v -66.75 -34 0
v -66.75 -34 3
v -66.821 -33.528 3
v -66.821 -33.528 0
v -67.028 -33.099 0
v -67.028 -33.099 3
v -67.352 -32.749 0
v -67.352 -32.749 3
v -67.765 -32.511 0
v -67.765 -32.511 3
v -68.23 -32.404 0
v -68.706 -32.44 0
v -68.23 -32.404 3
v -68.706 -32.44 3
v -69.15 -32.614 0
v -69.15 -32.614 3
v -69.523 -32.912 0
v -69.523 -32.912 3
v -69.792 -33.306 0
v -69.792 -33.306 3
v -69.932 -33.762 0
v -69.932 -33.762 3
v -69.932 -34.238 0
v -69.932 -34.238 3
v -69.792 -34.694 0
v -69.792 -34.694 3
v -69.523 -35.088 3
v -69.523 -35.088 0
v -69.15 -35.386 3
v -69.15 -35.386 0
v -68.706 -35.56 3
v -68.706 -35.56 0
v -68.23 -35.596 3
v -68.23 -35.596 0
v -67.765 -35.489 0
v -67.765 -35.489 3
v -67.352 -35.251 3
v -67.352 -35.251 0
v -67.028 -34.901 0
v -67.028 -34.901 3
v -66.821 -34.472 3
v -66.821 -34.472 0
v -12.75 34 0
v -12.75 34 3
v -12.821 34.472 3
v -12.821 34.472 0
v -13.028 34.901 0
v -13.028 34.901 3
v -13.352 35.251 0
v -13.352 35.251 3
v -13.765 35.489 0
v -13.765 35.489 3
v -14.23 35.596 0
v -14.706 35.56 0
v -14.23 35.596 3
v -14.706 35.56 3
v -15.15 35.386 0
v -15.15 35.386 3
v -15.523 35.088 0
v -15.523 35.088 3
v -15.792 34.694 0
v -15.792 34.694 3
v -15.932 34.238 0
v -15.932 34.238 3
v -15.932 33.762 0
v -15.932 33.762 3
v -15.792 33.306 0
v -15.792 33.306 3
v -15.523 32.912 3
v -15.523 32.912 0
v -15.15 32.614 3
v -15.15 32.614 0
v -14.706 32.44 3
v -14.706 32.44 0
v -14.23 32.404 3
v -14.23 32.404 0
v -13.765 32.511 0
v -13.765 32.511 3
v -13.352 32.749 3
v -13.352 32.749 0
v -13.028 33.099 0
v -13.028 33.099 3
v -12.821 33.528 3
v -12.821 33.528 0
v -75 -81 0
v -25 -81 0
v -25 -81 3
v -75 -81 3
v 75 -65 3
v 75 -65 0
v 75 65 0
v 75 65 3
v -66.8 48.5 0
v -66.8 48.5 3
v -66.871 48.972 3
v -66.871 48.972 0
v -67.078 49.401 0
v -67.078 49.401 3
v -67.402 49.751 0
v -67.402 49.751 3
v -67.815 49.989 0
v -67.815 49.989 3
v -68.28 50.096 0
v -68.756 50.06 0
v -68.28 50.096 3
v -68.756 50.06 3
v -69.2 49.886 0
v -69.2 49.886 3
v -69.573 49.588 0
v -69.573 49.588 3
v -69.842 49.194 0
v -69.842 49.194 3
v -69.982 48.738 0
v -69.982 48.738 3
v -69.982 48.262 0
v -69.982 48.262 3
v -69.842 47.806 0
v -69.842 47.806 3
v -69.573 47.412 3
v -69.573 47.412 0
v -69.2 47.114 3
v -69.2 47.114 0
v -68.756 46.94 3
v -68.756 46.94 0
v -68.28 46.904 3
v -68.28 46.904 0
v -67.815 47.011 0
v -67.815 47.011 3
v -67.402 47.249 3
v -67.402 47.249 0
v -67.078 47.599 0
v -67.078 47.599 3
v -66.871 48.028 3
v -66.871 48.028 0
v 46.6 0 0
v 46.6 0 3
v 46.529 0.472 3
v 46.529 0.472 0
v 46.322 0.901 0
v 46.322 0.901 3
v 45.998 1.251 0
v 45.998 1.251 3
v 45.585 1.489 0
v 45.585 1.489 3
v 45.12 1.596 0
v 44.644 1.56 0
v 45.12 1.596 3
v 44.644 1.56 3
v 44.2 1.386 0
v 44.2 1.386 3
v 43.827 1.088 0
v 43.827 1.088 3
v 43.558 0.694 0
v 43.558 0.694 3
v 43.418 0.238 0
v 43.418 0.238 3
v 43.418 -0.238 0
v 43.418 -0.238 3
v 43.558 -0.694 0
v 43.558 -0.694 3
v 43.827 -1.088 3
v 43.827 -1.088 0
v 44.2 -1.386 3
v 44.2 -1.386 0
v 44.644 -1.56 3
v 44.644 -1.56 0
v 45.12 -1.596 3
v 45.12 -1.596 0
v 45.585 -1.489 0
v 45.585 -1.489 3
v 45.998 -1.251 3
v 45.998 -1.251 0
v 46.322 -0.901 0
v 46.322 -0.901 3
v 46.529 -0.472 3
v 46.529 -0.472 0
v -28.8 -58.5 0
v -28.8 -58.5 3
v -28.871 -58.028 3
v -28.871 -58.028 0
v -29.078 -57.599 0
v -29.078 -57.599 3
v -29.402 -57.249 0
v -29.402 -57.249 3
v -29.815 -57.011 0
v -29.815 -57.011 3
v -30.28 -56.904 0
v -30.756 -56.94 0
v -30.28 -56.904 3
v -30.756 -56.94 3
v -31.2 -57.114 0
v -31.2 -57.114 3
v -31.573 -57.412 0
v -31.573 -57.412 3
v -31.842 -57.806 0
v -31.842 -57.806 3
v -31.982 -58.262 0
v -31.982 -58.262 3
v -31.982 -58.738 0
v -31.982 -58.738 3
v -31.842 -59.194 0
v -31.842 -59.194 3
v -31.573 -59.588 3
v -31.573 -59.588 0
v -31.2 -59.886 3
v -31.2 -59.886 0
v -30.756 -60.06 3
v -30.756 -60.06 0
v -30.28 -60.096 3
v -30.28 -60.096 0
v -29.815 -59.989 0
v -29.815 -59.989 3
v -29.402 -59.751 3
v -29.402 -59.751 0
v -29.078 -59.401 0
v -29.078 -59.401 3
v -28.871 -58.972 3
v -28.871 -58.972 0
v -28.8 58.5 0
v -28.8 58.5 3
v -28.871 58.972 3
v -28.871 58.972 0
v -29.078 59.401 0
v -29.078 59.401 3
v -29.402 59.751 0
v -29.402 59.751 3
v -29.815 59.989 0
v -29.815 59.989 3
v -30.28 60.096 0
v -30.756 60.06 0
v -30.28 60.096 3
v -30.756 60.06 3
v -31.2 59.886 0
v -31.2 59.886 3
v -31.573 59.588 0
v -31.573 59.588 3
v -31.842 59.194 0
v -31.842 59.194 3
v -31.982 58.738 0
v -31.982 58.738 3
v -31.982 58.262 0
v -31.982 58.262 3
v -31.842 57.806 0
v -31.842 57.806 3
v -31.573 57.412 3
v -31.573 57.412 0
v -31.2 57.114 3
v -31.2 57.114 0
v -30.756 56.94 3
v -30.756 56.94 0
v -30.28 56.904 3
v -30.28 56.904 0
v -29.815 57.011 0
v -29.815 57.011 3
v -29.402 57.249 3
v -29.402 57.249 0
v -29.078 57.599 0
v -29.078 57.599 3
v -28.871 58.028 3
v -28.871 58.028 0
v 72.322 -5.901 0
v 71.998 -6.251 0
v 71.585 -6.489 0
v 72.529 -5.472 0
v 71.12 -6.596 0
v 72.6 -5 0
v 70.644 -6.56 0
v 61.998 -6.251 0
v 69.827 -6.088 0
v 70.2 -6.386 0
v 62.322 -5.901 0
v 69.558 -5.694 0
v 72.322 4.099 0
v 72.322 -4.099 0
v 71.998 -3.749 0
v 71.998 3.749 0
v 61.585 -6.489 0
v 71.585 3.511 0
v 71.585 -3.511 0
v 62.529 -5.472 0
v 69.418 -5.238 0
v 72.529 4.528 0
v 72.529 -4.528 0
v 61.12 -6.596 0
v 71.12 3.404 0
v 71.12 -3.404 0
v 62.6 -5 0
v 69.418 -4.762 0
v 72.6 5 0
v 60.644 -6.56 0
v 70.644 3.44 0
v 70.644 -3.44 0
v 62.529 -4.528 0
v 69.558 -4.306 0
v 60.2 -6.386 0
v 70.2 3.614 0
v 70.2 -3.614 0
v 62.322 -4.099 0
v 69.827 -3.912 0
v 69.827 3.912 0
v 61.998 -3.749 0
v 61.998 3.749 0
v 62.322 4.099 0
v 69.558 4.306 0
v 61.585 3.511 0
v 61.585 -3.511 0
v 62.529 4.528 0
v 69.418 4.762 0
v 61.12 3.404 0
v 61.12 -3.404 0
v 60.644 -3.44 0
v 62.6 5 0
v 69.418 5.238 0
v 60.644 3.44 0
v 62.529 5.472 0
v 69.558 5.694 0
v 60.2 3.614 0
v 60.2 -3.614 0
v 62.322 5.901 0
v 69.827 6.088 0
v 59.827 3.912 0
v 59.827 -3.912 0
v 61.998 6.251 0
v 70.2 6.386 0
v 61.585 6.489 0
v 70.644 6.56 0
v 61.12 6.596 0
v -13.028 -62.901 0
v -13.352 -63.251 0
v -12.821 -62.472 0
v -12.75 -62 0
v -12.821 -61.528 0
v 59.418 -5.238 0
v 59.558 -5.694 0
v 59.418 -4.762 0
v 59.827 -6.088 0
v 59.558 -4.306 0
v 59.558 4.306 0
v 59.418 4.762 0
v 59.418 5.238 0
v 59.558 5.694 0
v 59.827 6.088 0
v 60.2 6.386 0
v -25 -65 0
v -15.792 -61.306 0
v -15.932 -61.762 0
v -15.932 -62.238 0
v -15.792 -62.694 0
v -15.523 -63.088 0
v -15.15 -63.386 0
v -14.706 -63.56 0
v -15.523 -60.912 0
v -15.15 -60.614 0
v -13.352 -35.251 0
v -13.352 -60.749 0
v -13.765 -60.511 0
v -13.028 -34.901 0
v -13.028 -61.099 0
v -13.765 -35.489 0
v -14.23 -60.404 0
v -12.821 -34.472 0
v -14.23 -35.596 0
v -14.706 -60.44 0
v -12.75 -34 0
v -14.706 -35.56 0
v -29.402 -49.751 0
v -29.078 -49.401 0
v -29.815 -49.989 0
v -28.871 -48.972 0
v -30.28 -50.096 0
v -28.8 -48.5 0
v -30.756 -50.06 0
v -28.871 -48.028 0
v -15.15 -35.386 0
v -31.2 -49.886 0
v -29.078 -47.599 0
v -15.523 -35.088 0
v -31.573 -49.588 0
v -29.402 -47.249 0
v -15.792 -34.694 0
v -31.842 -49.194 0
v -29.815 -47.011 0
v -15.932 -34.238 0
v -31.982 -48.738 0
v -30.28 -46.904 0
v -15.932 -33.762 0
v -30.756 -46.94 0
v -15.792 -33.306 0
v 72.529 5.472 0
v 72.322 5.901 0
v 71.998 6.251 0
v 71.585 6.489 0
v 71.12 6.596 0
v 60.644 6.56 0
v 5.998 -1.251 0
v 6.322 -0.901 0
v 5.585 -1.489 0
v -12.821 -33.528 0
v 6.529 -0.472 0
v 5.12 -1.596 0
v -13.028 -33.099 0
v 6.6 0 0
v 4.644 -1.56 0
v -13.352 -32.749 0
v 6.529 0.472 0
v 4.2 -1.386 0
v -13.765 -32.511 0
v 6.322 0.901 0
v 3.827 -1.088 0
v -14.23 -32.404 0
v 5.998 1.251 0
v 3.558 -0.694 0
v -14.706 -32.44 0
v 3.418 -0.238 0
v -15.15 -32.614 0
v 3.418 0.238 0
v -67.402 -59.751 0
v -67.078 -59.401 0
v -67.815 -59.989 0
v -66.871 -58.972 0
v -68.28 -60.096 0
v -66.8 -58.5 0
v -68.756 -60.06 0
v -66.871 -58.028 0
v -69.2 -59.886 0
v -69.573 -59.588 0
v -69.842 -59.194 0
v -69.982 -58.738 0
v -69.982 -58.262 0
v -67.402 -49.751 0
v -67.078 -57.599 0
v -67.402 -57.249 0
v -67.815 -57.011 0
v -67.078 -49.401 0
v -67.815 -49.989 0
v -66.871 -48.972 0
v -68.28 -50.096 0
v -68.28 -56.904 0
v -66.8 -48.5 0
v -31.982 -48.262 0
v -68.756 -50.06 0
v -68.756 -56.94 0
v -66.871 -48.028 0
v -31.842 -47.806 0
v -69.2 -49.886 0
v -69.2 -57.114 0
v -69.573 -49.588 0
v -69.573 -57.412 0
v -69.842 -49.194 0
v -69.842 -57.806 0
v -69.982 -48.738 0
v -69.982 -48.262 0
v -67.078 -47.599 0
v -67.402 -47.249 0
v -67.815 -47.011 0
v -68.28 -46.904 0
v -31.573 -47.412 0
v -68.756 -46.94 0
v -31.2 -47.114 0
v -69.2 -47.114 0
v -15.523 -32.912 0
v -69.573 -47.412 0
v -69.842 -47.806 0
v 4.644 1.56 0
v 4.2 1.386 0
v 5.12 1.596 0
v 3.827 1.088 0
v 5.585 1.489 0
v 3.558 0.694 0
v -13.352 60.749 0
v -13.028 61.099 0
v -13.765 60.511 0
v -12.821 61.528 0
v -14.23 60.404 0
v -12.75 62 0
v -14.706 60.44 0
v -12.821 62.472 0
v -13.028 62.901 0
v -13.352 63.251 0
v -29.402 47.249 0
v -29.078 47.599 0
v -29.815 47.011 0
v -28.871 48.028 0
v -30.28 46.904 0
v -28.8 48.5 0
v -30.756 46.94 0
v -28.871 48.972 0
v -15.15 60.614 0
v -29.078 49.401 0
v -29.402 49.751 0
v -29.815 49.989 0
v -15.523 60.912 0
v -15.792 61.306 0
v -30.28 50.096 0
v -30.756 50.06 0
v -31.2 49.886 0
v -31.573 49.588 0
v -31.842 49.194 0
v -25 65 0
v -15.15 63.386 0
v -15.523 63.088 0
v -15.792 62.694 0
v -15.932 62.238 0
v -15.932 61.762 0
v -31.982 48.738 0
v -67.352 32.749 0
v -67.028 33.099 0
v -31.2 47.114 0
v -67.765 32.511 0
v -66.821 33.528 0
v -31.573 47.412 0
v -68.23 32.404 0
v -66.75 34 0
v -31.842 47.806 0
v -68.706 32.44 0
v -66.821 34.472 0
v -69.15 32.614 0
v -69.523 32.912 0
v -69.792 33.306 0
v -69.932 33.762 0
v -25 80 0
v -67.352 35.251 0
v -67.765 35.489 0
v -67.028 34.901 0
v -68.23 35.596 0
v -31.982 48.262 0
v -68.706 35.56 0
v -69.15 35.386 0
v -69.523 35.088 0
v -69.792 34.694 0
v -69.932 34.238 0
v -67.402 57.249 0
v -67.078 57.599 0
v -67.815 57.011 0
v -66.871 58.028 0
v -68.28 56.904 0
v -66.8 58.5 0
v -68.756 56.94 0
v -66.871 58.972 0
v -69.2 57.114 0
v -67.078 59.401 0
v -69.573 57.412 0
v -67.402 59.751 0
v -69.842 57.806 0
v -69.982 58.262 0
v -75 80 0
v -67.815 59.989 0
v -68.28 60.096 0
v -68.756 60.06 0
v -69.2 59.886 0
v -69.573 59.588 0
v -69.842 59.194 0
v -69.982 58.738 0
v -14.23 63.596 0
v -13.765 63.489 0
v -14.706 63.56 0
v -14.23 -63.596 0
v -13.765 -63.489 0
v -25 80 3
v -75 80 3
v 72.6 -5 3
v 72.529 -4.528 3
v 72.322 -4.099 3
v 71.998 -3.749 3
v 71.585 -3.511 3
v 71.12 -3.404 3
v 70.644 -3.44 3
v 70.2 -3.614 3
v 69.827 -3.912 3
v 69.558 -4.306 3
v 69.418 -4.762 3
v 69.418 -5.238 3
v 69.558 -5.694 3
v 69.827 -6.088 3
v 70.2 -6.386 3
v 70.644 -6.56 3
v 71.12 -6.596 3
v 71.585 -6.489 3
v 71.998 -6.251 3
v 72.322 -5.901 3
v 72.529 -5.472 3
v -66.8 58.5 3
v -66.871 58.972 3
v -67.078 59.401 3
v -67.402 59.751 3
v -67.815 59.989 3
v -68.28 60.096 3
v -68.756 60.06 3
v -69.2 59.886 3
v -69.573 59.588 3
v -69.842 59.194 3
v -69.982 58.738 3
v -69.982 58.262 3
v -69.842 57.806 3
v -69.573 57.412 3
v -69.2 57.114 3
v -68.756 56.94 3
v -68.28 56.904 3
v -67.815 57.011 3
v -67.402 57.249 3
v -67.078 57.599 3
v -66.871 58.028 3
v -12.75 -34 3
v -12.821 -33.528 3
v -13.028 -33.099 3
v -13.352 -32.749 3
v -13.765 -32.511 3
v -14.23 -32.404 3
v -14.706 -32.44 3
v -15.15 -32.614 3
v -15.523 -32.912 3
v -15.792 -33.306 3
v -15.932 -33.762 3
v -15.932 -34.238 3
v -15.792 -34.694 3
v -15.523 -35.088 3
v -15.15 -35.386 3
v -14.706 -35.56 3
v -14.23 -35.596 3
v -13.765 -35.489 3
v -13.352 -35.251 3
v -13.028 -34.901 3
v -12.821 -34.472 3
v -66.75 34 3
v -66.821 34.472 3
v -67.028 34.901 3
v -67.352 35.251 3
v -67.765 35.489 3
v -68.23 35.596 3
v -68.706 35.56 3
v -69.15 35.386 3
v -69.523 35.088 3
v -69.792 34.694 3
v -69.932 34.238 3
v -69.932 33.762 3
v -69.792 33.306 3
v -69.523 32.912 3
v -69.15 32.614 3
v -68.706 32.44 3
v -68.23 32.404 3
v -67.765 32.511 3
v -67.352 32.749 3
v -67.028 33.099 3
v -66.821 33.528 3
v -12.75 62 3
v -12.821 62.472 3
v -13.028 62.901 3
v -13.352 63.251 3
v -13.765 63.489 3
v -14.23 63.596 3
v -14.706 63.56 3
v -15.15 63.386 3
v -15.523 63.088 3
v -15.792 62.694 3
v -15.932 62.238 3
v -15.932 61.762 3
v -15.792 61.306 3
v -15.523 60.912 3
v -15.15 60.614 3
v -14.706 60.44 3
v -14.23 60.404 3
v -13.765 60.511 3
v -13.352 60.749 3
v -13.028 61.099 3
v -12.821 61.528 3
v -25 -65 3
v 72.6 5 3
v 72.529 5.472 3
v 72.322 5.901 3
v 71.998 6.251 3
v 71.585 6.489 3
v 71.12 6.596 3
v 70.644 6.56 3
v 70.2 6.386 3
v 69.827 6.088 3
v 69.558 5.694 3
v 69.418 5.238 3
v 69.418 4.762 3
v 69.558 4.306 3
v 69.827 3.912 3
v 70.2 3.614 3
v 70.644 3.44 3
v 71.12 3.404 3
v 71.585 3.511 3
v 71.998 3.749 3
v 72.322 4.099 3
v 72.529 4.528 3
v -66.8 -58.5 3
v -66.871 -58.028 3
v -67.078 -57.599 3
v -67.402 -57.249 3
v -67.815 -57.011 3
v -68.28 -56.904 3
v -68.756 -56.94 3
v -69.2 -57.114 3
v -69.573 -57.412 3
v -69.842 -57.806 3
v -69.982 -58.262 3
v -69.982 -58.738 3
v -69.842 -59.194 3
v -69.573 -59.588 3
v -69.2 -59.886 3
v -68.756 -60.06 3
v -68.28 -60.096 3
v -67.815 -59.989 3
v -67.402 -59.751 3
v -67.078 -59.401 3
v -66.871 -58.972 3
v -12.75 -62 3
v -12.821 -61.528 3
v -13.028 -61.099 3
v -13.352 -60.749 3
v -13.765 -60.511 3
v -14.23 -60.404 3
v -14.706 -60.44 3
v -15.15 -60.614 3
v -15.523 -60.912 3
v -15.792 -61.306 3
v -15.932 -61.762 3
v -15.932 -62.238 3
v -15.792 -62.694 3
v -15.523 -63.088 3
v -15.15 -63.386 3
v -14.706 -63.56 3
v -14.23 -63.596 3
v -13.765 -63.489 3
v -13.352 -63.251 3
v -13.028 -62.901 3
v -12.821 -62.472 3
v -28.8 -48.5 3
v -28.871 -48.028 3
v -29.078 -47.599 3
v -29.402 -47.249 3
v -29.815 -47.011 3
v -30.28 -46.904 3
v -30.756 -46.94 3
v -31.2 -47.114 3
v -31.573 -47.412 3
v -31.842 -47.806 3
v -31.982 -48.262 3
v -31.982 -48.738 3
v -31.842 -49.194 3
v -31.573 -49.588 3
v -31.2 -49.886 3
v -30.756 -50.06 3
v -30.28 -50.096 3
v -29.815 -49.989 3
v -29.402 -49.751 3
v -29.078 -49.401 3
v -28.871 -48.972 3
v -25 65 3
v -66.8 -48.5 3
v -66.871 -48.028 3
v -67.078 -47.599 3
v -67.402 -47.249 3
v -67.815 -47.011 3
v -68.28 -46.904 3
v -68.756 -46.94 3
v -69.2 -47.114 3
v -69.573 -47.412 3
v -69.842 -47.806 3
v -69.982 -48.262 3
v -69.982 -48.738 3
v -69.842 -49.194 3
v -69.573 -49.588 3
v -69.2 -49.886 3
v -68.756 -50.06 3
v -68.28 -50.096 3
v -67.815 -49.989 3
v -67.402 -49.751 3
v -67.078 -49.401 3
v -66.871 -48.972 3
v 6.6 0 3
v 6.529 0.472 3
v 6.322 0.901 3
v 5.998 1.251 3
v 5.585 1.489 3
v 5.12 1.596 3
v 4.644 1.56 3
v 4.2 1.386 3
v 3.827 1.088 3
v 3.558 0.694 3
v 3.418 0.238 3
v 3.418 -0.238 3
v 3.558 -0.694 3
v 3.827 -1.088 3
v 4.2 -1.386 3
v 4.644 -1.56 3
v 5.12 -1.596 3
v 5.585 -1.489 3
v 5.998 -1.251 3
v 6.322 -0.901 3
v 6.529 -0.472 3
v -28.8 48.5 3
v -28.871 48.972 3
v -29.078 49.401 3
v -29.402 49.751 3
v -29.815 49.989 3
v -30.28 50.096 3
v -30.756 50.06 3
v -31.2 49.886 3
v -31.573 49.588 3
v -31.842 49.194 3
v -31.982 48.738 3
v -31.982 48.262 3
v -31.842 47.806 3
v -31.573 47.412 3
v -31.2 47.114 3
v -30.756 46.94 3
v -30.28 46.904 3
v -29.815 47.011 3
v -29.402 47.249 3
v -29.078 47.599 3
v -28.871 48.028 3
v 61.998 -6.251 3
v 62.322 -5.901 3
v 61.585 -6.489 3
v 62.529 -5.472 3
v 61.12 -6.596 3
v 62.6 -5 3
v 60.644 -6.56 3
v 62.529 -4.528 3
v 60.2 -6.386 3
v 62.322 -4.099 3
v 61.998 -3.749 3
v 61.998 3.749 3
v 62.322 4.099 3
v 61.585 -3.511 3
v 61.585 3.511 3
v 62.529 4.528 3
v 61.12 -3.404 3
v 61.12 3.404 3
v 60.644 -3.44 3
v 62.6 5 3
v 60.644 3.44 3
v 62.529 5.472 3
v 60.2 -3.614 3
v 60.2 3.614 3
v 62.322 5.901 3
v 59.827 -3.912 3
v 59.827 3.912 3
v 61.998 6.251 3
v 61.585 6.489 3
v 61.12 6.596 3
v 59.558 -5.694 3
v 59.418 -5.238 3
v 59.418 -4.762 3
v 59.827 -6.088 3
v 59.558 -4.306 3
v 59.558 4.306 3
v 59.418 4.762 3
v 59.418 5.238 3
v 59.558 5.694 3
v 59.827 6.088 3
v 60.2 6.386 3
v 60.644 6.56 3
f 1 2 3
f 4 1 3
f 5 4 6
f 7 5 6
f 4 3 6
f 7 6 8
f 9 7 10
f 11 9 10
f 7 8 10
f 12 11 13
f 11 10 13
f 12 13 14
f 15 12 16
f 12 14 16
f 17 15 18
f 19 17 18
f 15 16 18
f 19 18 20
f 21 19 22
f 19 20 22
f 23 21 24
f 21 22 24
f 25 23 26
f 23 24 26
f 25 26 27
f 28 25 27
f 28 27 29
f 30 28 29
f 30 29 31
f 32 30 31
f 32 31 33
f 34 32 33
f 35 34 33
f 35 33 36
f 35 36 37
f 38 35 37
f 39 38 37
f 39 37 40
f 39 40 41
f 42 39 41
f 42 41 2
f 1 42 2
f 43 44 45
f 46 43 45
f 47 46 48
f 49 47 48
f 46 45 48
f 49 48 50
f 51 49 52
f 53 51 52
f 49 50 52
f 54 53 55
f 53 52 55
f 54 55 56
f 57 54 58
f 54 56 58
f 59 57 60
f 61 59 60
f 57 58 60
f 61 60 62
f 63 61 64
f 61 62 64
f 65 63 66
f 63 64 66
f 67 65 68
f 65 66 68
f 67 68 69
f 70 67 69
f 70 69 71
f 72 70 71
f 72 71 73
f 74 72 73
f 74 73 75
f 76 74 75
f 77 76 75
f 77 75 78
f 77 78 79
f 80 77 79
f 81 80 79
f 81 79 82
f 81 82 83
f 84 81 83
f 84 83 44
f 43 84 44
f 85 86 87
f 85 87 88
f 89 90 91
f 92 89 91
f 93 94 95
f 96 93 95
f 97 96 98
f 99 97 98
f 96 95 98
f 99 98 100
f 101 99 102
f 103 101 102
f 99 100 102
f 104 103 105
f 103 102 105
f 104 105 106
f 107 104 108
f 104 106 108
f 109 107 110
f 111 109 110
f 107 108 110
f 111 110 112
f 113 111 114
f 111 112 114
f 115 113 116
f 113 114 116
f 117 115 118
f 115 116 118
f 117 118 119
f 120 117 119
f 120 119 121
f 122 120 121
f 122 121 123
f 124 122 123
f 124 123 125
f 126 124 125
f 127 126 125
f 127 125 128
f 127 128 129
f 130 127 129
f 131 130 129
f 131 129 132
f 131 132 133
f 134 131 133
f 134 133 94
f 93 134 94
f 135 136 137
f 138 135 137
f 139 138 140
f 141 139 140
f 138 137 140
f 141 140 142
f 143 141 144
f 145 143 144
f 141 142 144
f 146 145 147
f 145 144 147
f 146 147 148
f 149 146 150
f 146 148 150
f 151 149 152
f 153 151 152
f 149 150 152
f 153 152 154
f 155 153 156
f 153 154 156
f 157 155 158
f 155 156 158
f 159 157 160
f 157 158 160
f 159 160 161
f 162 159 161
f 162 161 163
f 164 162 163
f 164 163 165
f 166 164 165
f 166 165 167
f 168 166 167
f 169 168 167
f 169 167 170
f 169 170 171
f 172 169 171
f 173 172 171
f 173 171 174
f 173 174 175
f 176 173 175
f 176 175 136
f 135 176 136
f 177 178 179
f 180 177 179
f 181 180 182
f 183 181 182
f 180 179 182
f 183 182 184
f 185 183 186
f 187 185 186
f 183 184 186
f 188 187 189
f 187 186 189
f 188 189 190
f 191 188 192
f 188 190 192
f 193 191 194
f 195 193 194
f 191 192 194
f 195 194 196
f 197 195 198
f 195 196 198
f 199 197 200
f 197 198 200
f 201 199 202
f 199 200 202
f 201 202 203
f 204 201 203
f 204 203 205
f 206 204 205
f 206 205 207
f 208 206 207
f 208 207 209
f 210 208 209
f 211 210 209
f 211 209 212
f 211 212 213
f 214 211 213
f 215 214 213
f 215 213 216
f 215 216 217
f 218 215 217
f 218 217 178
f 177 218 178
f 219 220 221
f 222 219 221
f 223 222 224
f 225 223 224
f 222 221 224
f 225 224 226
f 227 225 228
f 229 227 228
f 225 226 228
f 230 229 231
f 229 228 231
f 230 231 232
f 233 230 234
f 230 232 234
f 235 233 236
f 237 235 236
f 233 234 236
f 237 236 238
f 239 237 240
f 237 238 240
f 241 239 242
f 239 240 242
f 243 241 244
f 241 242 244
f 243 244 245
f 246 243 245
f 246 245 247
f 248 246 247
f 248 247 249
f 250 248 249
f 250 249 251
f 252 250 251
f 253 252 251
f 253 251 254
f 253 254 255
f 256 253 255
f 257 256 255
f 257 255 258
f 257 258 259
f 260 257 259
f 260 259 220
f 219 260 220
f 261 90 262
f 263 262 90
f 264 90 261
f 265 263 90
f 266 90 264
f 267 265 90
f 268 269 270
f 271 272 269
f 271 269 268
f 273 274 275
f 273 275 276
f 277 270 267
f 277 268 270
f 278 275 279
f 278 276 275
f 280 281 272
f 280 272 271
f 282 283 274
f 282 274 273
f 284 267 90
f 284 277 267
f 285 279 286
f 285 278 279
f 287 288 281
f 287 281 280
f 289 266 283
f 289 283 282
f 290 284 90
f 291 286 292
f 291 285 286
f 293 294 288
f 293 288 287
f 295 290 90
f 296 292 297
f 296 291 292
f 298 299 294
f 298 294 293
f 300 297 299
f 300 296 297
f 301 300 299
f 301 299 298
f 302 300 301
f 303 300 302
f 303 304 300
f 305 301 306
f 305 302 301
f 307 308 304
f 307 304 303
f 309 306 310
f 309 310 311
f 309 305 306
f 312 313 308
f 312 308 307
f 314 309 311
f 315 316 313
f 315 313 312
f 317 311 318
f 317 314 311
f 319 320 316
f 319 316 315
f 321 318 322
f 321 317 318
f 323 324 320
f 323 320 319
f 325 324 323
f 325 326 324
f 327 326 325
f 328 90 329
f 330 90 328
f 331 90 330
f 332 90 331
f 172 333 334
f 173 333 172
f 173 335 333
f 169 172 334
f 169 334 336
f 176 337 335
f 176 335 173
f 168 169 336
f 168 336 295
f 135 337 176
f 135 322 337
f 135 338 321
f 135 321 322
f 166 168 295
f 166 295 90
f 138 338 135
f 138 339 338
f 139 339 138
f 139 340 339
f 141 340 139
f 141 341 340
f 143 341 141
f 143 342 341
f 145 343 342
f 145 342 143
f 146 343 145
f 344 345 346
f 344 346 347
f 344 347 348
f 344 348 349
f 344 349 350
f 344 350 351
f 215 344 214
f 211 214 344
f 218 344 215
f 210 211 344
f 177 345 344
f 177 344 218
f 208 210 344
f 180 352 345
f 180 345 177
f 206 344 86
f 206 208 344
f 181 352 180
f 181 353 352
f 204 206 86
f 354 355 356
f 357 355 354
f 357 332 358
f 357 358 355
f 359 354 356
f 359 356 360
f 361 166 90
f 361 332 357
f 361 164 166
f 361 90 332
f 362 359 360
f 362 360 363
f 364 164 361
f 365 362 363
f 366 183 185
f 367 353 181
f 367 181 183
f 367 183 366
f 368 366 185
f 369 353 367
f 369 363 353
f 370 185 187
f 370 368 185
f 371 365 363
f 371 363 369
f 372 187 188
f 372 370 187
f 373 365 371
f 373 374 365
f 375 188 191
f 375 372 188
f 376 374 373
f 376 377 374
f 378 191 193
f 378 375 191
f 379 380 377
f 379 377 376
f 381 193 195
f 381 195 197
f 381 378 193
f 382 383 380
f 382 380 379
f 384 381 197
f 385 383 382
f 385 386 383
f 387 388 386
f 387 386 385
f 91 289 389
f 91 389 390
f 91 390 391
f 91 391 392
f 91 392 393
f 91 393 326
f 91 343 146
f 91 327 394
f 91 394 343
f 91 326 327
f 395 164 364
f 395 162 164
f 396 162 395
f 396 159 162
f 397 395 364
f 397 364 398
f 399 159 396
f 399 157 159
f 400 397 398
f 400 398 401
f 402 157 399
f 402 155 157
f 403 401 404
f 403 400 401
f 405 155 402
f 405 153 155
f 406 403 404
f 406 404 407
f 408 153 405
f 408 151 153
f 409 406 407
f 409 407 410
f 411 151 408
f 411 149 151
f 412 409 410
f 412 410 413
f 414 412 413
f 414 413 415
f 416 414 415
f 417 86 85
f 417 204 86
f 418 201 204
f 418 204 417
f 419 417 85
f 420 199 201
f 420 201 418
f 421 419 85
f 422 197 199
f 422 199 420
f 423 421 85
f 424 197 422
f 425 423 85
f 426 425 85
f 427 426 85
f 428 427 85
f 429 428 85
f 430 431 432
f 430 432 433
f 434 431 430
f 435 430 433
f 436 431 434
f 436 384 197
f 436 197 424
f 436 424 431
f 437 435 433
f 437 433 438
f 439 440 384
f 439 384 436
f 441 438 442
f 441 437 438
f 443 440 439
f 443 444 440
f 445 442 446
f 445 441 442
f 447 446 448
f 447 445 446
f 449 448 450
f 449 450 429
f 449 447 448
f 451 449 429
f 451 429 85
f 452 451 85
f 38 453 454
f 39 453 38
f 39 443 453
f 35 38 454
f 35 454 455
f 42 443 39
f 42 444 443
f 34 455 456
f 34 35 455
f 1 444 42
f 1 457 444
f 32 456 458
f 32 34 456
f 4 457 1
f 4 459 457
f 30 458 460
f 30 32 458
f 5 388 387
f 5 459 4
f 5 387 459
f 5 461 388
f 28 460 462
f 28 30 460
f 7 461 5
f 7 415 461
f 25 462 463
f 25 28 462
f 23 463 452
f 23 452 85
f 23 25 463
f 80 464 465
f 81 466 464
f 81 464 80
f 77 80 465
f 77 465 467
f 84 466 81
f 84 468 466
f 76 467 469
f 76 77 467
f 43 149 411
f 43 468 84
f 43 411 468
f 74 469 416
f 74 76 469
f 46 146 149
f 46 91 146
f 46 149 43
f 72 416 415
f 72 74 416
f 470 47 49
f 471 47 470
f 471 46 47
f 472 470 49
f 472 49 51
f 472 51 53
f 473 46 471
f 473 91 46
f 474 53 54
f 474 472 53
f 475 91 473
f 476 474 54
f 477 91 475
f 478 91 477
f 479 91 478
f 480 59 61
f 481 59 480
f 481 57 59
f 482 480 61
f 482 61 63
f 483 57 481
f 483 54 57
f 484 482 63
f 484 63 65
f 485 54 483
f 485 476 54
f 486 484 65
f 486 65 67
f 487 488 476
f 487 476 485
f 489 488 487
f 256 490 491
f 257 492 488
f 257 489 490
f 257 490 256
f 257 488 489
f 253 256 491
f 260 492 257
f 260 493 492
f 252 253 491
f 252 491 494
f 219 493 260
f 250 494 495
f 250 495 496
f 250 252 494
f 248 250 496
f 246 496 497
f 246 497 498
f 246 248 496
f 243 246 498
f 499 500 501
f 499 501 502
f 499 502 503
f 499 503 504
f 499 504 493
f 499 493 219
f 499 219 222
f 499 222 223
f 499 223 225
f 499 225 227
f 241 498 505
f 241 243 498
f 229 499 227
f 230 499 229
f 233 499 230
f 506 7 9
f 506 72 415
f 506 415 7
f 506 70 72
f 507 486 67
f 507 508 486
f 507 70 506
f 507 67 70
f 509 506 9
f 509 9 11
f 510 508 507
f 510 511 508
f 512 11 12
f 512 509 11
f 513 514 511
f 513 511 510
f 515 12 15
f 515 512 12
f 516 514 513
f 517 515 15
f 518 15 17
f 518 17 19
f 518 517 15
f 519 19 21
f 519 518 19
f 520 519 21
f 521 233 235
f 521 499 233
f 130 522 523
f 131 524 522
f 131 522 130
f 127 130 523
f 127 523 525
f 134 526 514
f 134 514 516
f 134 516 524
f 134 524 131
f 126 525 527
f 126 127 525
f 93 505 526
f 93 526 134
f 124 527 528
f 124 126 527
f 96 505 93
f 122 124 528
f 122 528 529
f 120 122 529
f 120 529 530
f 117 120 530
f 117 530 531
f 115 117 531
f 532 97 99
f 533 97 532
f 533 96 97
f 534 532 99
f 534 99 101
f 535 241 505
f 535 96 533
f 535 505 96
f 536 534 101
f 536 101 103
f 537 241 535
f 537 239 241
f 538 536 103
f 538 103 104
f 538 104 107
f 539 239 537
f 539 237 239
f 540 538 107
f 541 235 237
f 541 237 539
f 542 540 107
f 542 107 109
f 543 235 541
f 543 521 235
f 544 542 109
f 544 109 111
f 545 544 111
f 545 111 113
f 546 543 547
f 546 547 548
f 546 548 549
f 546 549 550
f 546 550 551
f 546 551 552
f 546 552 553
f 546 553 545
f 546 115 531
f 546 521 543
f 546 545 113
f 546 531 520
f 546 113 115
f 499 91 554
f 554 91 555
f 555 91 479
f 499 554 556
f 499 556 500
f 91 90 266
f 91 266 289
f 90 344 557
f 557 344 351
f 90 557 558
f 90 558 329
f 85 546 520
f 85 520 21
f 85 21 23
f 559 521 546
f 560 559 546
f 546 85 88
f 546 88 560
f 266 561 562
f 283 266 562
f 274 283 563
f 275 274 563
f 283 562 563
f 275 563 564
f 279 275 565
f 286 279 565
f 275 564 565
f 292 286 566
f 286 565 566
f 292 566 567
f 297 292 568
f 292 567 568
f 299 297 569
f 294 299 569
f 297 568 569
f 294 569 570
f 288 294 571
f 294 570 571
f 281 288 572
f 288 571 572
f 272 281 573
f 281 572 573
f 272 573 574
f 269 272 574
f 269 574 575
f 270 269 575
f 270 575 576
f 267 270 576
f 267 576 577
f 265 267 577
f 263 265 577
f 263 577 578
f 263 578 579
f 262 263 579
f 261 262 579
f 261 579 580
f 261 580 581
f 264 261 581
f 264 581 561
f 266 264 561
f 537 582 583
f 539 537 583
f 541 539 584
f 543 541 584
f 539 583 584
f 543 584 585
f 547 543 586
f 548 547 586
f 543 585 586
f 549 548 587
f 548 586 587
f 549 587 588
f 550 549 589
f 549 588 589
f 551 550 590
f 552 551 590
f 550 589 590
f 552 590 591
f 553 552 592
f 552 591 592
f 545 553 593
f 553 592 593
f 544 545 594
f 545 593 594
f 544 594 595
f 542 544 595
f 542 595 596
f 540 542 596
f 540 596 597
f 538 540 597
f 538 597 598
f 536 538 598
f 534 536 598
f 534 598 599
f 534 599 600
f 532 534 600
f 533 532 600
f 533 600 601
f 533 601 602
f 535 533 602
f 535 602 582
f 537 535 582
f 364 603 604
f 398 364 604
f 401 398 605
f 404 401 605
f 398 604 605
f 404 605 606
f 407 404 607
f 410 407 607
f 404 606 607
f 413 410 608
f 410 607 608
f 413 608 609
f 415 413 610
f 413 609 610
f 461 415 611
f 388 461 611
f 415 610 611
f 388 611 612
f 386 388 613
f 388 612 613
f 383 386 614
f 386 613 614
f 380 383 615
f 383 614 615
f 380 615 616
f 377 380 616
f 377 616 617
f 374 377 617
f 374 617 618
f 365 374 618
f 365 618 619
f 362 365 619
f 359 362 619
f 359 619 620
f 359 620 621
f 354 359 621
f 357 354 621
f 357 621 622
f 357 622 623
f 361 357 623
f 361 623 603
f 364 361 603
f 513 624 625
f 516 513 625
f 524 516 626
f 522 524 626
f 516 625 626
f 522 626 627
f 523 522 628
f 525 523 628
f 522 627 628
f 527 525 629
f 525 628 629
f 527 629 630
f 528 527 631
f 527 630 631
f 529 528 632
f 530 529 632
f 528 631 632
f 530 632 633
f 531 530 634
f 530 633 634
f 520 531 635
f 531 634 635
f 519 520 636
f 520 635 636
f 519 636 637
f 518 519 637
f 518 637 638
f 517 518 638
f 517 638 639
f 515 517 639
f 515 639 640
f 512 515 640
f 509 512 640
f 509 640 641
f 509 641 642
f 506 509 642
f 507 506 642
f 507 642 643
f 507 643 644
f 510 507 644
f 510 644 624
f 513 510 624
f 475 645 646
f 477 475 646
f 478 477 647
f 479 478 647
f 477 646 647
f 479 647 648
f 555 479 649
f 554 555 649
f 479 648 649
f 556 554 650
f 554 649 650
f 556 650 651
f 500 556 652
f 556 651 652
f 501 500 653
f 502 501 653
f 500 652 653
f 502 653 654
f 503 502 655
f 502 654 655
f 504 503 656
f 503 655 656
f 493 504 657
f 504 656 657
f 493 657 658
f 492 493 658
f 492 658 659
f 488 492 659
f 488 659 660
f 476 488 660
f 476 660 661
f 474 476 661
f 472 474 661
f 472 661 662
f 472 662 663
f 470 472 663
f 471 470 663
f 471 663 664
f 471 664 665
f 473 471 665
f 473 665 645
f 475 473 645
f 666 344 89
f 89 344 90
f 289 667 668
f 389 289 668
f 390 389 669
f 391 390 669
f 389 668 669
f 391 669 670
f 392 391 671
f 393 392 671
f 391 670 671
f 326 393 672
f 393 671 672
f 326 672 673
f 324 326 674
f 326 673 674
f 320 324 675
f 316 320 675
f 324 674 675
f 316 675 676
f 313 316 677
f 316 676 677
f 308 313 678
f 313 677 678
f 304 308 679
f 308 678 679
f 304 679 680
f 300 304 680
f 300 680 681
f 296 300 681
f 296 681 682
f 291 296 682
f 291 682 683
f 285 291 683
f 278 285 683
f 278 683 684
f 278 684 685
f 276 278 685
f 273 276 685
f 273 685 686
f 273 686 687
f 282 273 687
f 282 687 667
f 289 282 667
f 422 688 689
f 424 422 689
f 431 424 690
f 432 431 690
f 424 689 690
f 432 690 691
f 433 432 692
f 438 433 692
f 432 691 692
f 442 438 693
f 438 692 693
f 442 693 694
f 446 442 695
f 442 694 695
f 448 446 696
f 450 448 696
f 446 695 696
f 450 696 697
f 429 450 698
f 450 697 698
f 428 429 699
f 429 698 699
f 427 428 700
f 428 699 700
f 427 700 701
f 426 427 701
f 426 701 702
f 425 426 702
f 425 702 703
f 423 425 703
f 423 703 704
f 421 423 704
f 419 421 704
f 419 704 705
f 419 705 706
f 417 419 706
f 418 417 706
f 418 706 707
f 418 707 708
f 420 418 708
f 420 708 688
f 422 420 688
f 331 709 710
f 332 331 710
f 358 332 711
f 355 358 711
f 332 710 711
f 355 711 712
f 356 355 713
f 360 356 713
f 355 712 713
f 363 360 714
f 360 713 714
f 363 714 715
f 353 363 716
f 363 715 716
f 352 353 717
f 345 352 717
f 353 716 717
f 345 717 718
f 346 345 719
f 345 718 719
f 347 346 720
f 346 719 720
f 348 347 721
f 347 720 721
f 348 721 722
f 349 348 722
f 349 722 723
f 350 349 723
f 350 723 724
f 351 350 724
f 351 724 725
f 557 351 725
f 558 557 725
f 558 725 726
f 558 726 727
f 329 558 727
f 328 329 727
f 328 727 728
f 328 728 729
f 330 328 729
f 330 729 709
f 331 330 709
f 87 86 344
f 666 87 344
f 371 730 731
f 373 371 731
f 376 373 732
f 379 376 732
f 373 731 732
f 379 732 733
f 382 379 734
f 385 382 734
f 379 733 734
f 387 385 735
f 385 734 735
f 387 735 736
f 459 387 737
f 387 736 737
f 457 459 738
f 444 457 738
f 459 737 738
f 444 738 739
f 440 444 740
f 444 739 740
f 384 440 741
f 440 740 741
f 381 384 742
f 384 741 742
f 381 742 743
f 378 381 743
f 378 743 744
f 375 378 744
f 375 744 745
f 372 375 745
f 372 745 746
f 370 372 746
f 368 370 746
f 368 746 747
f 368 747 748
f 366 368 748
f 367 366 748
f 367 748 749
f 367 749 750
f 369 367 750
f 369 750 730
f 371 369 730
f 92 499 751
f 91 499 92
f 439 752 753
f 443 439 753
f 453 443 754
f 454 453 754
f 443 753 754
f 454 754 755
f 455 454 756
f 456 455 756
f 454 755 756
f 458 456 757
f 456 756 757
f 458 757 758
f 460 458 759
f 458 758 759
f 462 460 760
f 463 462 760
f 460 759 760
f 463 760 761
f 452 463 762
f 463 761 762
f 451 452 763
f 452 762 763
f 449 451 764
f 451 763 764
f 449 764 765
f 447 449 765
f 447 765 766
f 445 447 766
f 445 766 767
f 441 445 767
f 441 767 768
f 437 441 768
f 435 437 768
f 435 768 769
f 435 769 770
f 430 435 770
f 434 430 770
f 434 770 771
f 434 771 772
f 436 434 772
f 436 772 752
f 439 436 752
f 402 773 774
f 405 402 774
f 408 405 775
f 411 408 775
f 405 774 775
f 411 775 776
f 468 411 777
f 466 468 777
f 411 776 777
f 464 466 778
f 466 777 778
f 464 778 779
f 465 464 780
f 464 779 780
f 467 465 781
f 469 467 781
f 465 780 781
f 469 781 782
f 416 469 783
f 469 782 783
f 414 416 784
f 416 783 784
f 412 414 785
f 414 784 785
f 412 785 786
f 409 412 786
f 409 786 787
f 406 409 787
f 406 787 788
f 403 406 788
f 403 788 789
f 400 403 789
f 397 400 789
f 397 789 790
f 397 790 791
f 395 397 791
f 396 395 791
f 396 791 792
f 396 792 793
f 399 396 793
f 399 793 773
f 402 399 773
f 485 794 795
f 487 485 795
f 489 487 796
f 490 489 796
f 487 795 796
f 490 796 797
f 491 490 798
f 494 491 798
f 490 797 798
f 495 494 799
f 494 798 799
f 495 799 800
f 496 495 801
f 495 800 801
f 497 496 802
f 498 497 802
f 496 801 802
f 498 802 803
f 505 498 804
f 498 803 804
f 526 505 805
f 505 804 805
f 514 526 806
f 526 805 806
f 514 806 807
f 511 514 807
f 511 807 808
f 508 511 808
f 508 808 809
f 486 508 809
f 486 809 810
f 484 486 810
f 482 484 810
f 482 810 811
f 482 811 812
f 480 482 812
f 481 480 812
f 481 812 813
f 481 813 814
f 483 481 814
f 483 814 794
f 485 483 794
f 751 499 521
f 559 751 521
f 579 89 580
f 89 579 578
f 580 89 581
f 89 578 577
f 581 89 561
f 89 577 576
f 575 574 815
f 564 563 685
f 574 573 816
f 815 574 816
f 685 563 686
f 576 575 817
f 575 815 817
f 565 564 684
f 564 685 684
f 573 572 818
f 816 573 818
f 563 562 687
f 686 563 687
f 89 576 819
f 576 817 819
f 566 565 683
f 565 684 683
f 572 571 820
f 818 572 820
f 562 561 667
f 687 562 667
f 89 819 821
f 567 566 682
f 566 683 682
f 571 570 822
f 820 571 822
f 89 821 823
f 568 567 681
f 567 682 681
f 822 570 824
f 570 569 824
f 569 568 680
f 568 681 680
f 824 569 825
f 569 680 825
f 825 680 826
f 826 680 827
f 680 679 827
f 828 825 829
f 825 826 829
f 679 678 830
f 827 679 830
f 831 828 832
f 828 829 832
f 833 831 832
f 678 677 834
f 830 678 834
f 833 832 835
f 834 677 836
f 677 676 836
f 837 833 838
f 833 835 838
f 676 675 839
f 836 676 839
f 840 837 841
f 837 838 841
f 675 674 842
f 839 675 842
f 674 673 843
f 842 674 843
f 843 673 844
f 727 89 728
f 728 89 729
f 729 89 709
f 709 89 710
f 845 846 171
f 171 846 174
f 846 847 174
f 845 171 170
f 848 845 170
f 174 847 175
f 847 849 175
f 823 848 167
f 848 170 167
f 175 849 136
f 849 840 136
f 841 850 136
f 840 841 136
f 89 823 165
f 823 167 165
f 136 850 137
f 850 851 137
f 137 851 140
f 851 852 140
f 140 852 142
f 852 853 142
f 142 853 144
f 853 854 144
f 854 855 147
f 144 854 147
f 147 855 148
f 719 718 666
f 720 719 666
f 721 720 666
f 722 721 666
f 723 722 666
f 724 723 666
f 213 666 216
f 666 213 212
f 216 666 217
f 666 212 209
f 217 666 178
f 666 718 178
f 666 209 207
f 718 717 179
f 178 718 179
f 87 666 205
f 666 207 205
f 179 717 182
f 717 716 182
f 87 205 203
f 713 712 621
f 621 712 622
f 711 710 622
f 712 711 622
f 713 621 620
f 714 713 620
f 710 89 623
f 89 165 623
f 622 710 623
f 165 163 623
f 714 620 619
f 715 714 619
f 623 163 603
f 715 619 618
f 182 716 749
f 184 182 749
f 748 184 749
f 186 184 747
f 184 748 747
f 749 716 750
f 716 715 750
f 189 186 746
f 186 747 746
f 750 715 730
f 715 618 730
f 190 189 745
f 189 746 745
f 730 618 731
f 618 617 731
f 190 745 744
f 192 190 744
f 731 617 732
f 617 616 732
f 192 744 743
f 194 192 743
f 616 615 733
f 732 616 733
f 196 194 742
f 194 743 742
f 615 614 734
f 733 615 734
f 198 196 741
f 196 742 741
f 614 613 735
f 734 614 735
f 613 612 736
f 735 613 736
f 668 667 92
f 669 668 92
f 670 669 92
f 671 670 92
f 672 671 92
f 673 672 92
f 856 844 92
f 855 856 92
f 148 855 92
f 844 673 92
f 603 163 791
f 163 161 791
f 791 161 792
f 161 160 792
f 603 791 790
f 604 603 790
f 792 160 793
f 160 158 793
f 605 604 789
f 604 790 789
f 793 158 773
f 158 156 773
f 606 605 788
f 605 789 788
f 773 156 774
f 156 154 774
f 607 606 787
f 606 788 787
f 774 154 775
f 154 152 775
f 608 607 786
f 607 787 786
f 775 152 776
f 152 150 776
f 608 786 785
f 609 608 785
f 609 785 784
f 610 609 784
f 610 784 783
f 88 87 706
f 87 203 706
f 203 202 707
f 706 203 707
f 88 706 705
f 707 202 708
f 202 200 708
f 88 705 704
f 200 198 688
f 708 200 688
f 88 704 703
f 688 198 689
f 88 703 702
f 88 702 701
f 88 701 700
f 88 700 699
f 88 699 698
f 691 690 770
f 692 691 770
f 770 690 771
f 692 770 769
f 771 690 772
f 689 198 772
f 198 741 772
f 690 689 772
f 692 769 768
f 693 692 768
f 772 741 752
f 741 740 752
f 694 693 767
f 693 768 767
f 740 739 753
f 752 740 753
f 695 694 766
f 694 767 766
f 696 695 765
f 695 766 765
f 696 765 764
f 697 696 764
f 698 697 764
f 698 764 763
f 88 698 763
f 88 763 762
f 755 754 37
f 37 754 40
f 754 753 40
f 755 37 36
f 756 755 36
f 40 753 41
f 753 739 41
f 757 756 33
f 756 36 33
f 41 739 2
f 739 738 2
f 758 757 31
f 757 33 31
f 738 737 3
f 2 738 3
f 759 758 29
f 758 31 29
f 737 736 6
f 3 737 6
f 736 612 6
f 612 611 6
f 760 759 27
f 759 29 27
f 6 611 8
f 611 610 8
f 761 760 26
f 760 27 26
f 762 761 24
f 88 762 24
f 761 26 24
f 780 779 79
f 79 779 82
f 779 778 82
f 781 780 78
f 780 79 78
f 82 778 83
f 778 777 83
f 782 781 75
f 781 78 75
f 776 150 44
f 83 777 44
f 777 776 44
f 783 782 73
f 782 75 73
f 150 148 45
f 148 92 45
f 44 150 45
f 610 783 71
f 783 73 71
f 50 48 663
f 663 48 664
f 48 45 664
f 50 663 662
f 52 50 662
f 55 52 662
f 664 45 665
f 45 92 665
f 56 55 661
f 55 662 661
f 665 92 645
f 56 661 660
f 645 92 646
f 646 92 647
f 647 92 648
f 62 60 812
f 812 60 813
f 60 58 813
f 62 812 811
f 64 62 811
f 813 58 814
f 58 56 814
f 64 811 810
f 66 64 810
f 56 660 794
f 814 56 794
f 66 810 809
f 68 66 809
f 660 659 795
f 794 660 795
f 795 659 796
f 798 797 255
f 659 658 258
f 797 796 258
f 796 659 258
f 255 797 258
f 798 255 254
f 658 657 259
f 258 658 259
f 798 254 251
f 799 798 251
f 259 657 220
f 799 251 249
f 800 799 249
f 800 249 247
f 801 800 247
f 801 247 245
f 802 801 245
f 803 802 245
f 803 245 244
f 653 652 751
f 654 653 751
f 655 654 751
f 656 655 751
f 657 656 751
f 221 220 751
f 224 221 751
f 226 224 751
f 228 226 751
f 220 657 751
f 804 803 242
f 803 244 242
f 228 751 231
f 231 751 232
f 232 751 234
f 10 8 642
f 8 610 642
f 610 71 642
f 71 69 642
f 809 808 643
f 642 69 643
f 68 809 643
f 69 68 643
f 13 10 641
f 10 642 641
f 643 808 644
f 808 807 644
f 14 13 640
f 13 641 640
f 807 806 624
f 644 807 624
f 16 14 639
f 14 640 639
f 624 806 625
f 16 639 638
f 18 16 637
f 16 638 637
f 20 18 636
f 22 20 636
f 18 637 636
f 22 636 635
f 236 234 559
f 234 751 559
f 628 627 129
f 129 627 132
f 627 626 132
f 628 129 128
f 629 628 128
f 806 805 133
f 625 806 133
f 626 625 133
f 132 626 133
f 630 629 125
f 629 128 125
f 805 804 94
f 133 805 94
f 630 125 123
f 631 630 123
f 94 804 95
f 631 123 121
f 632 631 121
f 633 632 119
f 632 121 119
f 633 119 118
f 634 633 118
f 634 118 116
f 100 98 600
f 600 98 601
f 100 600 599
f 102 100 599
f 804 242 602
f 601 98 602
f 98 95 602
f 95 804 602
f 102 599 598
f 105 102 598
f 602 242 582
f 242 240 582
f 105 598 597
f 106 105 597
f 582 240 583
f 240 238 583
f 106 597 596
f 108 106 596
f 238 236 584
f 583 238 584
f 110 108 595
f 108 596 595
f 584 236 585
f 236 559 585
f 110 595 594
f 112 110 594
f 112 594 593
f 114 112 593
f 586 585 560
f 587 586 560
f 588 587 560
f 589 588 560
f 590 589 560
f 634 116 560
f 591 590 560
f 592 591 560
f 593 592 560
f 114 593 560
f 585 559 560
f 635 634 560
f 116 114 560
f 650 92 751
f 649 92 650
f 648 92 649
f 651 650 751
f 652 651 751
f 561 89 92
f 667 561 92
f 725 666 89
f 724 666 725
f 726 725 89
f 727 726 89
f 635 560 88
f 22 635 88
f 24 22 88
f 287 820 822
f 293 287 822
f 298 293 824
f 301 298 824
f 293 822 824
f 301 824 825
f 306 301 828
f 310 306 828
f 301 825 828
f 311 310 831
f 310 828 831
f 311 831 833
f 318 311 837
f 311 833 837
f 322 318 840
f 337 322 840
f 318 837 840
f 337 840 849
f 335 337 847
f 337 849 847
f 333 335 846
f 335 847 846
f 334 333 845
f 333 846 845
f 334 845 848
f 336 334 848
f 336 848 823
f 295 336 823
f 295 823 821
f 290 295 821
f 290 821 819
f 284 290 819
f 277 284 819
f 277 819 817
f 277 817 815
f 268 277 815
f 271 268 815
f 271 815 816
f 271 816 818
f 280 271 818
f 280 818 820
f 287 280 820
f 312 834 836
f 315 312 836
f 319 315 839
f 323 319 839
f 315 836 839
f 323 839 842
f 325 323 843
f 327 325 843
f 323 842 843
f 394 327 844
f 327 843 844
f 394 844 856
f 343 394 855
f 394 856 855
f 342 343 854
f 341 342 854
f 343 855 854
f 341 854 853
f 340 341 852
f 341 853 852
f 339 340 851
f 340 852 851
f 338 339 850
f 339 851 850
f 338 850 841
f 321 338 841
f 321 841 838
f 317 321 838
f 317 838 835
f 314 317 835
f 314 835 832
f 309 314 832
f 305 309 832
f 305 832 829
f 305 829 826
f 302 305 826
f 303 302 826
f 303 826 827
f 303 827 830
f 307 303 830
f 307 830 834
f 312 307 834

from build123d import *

# Parameters (mm, degrees)
SKETCH1_W           = 150
SKETCH1_H           = 130
BOSS_EXTRUDE1_DEPTH = 3
SKETCH3_W           = 50
SKETCH3_H           = 15
SKETCH3_H_2         = 16
BOSS_EXTRUDE2_DEPTH = 3
SKETCH2_R           = 1.6
CUT_EXTRUDE1_DEPTH  = 10


with BuildPart() as part:
    # Sketch1 → Boss-Extrude1 (new body)
    with BuildSketch(Plane.XY):
        Rectangle(SKETCH1_W, SKETCH1_H)
    extrude(amount=BOSS_EXTRUDE1_DEPTH)

    # Sketch3 → Boss-Extrude2 (add)
    with BuildSketch(Plane(origin=(0, 0, 0), x_dir=(-1, 0, 0), z_dir=(0, 0, -1))):
        with Locations((50, 72.5)):
            Rectangle(SKETCH3_W, SKETCH3_H)
        with Locations((50, -73)):
            Rectangle(SKETCH3_W, SKETCH3_H_2)
    extrude(amount=-BOSS_EXTRUDE2_DEPTH)

    # Sketch2 → Cut-Extrude1 (cut)
    with BuildSketch(Plane.XY.offset(3)):
        with Locations((-30.4, 58.5)):
            Circle(SKETCH2_R)
        with Locations((-68.4, 58.5)):
            Circle(SKETCH2_R)
        with Locations((-68.4, 48.5)):
            Circle(SKETCH2_R)
        with Locations((-30.4, 48.5)):
            Circle(SKETCH2_R)
        with Locations((-68.4, -48.5)):
            Circle(SKETCH2_R)
        with Locations((-68.4, -58.5)):
            Circle(SKETCH2_R)
        with Locations((-30.4, -58.5)):
            Circle(SKETCH2_R)
        with Locations((-30.4, -48.5)):
            Circle(SKETCH2_R)
        with Locations((71, -5)):
            Circle(SKETCH2_R)
        with Locations((71, 5)):
            Circle(SKETCH2_R)
        with Locations((61, -5)):
            Circle(SKETCH2_R)
        with Locations((61, 5)):
            Circle(SKETCH2_R)
        with Locations((-68.35, -34)):
            Circle(SKETCH2_R)
        with Locations((-14.35, -34)):
            Circle(SKETCH2_R)
        with Locations((-14.35, -62)):
            Circle(SKETCH2_R)
        with Locations((-14.35, 62)):
            Circle(SKETCH2_R)
        with Locations((-14.35, 34)):
            Circle(SKETCH2_R)
        with Locations((-68.35, 34)):
            Circle(SKETCH2_R)
        with Locations((45, 0)):
            Circle(SKETCH2_R)
        with Locations((5, 0)):
            Circle(SKETCH2_R)
    extrude(amount=-CUT_EXTRUDE1_DEPTH, mode=Mode.SUBTRACT)


solid = part.part
